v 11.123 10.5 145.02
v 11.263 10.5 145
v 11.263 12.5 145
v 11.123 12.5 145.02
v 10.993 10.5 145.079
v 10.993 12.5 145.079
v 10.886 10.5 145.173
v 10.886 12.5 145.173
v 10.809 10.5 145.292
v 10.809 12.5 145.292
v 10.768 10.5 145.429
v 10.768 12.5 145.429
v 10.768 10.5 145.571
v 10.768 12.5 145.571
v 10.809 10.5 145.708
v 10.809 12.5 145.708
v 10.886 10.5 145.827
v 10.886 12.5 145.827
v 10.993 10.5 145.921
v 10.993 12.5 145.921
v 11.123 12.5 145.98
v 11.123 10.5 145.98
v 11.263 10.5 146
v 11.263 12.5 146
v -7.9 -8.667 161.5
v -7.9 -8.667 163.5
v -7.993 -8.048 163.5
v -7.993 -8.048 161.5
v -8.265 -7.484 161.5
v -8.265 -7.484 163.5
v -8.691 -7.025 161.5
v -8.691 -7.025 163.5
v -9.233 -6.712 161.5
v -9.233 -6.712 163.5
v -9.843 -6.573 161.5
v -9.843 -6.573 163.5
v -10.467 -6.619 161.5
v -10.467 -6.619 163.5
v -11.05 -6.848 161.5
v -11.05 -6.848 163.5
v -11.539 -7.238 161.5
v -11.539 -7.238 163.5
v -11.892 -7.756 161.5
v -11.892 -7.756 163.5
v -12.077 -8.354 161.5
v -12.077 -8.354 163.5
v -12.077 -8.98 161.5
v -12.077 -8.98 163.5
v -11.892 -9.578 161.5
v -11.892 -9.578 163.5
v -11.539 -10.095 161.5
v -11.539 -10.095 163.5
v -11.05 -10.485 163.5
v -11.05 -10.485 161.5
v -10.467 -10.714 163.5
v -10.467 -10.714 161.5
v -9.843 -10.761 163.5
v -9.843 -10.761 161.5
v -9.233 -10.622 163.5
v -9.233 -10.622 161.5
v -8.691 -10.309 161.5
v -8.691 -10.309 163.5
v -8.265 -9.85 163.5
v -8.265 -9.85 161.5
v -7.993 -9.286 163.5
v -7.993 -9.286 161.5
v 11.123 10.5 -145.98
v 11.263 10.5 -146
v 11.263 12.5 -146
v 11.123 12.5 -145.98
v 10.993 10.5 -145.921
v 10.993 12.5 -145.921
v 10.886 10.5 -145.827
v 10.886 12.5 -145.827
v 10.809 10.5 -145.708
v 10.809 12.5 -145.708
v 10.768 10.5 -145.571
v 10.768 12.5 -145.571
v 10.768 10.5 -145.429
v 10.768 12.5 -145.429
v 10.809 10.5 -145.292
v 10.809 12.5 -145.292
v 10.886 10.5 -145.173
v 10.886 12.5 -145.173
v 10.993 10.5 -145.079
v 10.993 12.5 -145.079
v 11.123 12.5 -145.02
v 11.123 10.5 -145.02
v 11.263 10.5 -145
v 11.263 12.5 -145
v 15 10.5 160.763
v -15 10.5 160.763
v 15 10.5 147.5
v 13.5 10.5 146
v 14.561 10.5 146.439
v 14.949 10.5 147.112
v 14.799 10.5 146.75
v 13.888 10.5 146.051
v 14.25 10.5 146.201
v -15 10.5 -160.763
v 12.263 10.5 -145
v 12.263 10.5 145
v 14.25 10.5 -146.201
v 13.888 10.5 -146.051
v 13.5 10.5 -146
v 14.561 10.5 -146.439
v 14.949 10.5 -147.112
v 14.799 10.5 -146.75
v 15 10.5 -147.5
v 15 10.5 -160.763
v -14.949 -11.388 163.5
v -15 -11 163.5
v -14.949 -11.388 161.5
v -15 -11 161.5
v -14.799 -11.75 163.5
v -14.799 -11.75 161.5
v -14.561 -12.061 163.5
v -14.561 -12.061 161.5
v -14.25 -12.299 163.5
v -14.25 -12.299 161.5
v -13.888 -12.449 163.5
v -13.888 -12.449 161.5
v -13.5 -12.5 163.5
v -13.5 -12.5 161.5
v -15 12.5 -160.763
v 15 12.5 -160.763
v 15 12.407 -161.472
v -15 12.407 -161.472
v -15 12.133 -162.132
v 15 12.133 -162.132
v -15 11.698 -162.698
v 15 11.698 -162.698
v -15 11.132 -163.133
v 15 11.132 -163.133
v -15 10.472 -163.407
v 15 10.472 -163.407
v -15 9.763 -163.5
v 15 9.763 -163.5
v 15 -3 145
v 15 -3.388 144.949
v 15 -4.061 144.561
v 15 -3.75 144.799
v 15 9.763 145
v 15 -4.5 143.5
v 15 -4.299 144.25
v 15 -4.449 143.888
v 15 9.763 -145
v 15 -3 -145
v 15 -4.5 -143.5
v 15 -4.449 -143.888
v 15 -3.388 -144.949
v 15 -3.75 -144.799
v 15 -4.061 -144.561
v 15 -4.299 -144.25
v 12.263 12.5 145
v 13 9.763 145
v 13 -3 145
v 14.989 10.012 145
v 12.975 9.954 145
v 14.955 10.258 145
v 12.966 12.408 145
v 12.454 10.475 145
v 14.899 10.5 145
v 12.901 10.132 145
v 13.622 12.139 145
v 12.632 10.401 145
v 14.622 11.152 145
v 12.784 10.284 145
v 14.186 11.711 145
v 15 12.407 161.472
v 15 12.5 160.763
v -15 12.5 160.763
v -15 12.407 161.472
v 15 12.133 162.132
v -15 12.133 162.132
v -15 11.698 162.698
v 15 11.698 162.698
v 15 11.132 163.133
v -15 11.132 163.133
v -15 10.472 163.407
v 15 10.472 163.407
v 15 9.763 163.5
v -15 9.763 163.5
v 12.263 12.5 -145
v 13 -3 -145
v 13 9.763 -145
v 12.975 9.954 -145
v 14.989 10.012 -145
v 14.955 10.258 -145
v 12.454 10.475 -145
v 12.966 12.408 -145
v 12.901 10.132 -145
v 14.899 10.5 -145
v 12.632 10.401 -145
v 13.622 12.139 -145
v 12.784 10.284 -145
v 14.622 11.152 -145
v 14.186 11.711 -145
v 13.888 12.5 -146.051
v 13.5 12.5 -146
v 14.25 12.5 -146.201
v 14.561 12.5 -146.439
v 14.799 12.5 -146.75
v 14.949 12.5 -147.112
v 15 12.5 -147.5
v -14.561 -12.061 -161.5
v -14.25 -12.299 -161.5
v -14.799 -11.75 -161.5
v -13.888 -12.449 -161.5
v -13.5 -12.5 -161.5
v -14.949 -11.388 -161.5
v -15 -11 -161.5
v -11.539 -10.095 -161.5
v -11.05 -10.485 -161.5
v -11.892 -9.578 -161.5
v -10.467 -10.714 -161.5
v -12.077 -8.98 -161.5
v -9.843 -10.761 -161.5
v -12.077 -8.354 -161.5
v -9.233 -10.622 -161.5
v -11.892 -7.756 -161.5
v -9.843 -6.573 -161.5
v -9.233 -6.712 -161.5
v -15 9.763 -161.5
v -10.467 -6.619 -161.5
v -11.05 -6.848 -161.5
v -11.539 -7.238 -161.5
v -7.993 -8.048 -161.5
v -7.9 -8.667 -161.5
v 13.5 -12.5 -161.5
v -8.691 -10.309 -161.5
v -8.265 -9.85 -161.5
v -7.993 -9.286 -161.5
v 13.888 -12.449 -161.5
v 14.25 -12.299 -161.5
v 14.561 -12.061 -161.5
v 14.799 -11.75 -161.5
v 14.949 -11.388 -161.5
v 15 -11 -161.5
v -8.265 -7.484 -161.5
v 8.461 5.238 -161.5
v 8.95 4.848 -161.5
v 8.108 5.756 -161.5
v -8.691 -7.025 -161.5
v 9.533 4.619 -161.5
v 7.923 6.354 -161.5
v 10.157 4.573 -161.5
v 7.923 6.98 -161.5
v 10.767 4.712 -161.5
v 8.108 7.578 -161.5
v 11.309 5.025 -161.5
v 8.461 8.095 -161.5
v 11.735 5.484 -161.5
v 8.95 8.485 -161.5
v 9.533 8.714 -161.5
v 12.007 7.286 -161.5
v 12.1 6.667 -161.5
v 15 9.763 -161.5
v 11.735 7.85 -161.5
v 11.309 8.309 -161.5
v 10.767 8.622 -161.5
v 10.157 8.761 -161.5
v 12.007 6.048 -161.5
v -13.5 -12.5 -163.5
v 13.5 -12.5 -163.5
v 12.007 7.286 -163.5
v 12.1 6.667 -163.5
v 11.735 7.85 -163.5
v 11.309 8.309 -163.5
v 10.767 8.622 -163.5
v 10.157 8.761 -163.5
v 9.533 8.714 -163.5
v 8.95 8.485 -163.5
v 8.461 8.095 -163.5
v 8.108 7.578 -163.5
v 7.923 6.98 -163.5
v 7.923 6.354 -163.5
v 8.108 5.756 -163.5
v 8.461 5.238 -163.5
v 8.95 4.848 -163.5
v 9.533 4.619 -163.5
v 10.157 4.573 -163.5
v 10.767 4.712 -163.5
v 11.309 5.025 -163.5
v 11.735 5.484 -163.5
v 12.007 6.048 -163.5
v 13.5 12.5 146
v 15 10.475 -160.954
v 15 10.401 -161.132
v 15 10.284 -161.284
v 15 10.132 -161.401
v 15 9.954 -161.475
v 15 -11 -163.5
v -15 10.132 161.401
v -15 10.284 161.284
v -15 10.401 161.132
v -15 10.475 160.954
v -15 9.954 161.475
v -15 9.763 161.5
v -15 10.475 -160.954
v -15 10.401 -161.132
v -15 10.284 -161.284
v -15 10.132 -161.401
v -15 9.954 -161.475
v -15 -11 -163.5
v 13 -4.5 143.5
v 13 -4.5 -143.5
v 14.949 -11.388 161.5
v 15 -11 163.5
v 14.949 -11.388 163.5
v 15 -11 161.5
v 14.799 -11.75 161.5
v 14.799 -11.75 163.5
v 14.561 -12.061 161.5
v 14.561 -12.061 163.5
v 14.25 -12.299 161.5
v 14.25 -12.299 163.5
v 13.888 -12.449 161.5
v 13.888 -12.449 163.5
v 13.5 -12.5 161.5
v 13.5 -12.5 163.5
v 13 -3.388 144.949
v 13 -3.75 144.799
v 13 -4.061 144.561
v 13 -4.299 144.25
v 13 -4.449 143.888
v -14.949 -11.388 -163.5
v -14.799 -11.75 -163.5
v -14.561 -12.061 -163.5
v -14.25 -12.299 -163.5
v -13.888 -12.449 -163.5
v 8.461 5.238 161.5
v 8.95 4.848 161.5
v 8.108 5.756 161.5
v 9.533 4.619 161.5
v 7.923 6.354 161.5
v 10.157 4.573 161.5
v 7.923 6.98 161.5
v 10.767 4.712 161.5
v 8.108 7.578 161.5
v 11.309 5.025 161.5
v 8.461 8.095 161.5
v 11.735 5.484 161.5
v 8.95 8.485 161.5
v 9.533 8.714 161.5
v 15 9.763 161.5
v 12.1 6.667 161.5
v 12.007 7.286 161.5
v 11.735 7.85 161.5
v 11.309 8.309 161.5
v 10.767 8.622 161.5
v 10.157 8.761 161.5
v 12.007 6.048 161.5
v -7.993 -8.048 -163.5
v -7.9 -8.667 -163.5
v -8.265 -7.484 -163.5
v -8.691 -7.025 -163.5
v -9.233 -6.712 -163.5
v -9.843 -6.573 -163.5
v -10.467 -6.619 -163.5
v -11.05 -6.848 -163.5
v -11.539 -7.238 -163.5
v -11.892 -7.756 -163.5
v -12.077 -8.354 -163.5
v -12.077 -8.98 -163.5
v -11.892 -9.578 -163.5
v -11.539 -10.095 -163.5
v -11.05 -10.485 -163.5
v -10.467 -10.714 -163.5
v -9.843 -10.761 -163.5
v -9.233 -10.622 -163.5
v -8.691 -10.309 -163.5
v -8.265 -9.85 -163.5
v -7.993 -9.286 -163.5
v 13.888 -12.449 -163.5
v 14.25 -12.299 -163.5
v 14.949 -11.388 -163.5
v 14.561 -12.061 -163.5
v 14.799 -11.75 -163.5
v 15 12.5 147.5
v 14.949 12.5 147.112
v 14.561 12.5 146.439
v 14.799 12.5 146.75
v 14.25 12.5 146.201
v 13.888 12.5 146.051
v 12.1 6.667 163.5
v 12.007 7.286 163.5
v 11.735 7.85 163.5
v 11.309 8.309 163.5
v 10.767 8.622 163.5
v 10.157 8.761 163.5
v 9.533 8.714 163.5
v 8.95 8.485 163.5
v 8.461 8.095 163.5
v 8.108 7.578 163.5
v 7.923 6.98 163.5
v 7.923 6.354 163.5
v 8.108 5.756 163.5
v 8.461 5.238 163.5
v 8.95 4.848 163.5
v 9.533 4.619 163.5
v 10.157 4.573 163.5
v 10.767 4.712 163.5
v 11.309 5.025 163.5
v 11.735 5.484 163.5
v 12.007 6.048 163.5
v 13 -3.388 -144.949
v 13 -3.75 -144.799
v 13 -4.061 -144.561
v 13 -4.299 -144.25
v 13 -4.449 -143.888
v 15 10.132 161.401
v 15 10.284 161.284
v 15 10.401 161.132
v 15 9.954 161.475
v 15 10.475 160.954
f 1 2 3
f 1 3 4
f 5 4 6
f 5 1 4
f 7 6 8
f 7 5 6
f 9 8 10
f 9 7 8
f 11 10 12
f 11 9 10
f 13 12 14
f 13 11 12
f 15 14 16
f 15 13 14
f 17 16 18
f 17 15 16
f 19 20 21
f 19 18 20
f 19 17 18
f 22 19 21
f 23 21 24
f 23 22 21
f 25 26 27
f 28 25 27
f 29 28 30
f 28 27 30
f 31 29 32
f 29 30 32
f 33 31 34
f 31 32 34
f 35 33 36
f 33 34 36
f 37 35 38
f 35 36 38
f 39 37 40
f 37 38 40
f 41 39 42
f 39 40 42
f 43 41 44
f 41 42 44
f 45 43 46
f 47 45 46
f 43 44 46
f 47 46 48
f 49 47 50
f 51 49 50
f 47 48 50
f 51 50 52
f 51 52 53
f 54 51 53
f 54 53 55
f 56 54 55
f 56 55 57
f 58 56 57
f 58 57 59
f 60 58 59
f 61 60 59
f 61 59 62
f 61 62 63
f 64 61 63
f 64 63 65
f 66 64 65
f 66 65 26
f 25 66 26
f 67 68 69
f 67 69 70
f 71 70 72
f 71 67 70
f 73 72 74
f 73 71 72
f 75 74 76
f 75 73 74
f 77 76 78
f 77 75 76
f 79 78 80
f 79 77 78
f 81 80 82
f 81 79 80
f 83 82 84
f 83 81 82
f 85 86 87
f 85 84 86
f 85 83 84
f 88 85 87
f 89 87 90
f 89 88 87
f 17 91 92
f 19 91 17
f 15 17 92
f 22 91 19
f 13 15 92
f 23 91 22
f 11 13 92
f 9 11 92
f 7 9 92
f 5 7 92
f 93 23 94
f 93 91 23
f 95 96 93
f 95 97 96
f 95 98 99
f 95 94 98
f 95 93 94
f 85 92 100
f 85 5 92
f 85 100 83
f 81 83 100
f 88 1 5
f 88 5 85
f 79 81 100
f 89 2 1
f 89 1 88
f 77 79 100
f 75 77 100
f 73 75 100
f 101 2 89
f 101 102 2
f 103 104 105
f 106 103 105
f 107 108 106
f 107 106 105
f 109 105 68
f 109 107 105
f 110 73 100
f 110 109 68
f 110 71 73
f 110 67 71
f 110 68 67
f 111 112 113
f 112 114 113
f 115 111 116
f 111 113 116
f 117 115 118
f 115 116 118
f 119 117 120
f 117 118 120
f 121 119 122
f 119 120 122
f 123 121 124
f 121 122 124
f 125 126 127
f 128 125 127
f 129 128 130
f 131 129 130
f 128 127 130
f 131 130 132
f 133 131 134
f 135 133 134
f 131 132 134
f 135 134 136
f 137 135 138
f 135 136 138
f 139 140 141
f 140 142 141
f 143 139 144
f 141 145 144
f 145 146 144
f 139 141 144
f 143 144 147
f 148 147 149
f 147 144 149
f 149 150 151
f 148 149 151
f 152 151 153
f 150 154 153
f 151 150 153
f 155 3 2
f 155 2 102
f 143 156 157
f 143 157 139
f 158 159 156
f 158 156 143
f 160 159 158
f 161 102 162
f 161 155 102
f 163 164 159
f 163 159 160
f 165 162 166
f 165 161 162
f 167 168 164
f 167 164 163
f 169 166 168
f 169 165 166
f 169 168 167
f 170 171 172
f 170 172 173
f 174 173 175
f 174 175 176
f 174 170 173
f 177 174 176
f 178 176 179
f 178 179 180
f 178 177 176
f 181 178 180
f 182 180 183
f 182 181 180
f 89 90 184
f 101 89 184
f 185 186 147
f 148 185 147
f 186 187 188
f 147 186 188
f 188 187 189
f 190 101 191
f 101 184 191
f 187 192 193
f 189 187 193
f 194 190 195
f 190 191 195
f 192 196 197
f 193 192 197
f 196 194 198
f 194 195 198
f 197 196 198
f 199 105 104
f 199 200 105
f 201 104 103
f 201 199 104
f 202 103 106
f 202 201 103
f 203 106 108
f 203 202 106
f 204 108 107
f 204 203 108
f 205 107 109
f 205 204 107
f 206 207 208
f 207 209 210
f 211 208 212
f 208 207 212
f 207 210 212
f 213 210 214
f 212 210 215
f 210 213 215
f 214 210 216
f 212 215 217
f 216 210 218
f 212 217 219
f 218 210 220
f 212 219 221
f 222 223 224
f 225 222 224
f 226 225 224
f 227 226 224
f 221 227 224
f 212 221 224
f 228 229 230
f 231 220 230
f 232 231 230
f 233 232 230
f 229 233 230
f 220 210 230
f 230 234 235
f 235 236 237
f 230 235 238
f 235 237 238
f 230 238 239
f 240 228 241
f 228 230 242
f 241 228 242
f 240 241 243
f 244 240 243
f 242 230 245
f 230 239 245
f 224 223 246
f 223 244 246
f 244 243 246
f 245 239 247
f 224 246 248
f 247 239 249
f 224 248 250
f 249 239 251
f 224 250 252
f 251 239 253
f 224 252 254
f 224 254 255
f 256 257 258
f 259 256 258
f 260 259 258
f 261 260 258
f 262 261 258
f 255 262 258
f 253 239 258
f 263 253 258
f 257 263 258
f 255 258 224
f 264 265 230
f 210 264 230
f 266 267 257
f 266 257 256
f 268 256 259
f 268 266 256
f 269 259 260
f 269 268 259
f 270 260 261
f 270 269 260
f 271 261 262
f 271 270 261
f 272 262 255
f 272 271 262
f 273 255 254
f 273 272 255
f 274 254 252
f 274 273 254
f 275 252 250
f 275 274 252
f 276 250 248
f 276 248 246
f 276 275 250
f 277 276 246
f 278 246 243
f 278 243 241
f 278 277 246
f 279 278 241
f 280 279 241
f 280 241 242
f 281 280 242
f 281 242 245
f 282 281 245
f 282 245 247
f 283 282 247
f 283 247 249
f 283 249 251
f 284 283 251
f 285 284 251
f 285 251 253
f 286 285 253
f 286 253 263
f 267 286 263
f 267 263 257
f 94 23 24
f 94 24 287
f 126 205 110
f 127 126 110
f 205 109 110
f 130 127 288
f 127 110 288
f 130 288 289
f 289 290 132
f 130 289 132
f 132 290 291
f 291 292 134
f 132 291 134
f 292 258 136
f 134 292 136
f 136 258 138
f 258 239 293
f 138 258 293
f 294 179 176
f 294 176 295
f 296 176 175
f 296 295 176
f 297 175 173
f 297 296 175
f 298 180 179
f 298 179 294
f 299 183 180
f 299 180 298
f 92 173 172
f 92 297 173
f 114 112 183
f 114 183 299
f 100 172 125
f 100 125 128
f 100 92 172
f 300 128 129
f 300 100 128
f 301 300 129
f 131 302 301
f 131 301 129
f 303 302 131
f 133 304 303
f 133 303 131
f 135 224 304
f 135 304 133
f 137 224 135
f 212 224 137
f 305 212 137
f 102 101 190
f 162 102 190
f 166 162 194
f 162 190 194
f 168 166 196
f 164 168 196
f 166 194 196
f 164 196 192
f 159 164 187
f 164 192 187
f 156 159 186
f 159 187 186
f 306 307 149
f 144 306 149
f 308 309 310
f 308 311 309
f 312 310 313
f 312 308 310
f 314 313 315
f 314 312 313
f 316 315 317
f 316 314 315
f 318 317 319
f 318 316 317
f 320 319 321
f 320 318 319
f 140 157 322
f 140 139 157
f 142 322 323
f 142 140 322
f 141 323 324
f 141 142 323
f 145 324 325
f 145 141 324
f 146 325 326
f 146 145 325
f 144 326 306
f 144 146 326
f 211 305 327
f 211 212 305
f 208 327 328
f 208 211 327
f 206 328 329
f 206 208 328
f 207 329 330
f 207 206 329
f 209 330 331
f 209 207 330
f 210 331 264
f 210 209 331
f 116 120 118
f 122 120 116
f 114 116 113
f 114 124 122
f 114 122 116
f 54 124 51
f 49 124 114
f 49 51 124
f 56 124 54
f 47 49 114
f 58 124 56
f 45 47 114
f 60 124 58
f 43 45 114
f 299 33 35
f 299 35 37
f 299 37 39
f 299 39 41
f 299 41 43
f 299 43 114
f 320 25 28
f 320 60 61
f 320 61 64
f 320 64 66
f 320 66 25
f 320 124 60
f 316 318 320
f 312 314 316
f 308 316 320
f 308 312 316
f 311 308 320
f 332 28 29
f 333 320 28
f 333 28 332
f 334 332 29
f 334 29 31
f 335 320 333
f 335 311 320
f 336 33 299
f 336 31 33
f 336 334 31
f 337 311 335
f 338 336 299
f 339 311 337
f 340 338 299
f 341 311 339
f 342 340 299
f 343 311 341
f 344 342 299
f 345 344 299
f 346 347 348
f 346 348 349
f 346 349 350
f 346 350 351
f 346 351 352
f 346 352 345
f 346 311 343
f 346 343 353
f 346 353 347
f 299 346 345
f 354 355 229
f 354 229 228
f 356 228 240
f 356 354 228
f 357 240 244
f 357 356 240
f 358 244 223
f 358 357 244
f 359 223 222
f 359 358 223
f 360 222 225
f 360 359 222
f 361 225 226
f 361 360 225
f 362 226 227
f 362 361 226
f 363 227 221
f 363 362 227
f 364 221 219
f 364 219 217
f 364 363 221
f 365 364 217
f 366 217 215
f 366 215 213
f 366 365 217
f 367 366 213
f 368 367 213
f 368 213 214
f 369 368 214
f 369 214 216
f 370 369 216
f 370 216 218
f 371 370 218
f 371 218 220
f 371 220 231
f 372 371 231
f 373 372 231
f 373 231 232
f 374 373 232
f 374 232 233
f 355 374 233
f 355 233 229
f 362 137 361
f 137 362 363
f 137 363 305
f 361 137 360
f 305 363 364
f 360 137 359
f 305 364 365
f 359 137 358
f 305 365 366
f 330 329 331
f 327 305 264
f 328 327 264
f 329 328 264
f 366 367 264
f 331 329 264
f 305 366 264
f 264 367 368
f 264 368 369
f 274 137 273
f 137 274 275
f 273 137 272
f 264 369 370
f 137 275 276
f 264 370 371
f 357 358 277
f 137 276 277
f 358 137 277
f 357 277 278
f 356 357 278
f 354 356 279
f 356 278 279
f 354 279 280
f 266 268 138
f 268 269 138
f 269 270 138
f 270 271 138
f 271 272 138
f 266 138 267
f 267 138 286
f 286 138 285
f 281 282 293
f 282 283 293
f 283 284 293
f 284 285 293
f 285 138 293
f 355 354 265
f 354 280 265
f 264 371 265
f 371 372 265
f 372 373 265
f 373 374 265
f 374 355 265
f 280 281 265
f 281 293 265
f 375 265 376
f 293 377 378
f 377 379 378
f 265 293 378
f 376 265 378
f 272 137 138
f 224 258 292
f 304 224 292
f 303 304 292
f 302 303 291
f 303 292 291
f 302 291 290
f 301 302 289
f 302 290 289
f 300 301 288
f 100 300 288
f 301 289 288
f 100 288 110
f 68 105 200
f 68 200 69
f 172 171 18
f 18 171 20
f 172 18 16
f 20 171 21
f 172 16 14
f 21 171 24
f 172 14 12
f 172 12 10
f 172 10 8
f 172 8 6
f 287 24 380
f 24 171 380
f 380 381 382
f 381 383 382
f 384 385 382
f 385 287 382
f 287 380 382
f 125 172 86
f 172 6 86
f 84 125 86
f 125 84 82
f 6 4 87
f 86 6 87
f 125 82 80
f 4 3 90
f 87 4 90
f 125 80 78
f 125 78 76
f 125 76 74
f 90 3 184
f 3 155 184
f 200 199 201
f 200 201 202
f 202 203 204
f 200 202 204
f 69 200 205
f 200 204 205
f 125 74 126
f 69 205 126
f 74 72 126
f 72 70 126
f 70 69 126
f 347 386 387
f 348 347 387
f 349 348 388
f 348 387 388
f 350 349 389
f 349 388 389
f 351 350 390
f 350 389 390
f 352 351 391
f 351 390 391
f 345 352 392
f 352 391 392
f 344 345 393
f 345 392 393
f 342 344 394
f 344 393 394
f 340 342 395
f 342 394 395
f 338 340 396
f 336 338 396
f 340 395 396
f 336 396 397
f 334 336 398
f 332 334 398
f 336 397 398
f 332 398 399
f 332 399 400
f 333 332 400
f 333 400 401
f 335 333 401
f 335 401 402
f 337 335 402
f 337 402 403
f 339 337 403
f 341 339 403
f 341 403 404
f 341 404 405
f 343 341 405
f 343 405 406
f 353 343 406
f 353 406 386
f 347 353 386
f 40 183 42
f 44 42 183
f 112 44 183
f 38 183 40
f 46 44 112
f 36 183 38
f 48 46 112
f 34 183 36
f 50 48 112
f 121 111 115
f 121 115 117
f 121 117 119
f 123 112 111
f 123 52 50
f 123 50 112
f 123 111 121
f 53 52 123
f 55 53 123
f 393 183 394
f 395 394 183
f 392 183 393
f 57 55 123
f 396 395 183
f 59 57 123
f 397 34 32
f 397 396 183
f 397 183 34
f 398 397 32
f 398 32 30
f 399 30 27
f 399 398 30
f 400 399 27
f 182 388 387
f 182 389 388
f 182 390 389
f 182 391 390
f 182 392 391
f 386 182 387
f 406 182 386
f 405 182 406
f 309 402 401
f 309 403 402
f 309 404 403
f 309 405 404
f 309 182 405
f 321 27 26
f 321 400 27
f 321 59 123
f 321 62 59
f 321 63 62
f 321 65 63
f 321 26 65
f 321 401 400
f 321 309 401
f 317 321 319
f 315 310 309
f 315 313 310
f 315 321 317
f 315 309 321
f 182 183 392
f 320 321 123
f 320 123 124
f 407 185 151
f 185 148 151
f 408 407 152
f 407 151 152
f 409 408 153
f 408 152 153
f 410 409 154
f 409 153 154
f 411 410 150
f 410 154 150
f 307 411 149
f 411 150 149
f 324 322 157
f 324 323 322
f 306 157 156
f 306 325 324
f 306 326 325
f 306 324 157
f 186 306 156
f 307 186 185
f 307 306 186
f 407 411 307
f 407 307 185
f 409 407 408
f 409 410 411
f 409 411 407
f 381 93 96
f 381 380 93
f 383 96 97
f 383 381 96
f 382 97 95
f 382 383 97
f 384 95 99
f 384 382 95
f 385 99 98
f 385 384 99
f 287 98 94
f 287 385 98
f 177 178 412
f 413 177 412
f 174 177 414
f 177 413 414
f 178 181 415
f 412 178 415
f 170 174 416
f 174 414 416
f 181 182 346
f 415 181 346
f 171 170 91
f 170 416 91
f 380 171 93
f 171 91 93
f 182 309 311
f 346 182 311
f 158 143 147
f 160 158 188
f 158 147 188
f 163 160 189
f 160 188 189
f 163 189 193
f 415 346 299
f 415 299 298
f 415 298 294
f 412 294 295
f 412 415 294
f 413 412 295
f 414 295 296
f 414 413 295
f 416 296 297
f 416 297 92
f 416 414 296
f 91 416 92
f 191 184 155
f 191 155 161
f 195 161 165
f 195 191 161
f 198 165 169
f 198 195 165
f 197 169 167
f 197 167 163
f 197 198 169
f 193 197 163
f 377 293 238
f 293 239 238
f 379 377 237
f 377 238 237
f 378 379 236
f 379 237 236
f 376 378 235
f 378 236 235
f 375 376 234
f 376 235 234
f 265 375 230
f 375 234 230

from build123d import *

# Parameters (mm, degrees)
SKETCH1_W                    = 327
SKETCH1_H                    = 2
BASE_FLANGE1_DEPTH           = 15
EDGE_FLANGE1_STRIP_W         = 9.4732
EDGE_FLANGE1_STRIP_H         = 2
EDGE_FLANGE1_STRIP_CUT_DEPTH = 30
EDGE_FLANGE1_DEPTH           = 30
CUT_EXTRUDE1_REACH           = 329.582
SKETCH9_R                    = 2.1
EDGE_FLANGE2_START           = 9.7634
EDGE_FLANGE2_DEPTH           = 3.2366
EDGE_FLANGE2_START_2         = -4.5
EDGE_FLANGE2_2_OUTLINE_W     = 2
EDGE_FLANGE2_2_OUTLINE_H     = 290
EDGE_FLANGE2_2_DEPTH         = 14.2634
EDGE_FLANGE2_START_3         = -145
EDGE_FLANGE2_3_DEPTH         = 290
EDGE_FLANGE2_4_DEPTH         = 290
FILLET1_R                    = 1.5


with BuildPart() as part:
    # Base-Flange1: sheet metal written as solids
    # Sketch1 → Base-Flange1 (new, symmetric)
    with BuildSketch(Plane(origin=(0, 0, 0), x_dir=(0, 0, -1), z_dir=(1, 0, 0))):
        with Locations((0, 11.5)):
            Rectangle(SKETCH1_W, SKETCH1_H)
    extrude(amount=BASE_FLANGE1_DEPTH, both=True)

    # Edge-Flange1: sheet metal written as solids
    # Edge-Flange1 strip (on a plane across the edge) → Edge-Flange1 strip cut (cut)
    with BuildSketch(Plane(origin=(15, 10.5, 163.5), x_dir=(0, 0, -1), z_dir=(-1, 0, 0))):
        with Locations((-2, -1)):
            Rectangle(EDGE_FLANGE1_STRIP_W, EDGE_FLANGE1_STRIP_H)
    edge_flange1_strip_cut = extrude(amount=EDGE_FLANGE1_STRIP_CUT_DEPTH, mode=Mode.SUBTRACT)

    # Edge-Flange1 section (on a plane across the edge) → Edge-Flange1 (add)
    with BuildSketch(Plane(origin=(15, 10.5, 163.5), x_dir=(0, 0, -1), z_dir=(-1, 0, 0))):
        with BuildLine():
            Line((0, 0.7366), (0, 23))
            Line((0, 23), (2, 23))
            Line((2, 23), (2, 0.7366))
            ThreePointArc((2, 0.7366), (2.215745145, 0.215745145), (2.7366, 0))
            Line((2.7366, 0), (2.7366, -2))
            ThreePointArc((2.7366, -2), (0.801531583, -1.198468417), (0, 0.7366))
        make_face()
    edge_flange1 = extrude(amount=EDGE_FLANGE1_DEPTH)

    # Mirror1: Edge-Flange1 strip cut, Edge-Flange1 across plane
    add(edge_flange1_strip_cut.mirror(Plane.XY), mode=Mode.SUBTRACT)
    add(edge_flange1.mirror(Plane.XY))

    # Sketch9 → Cut-Extrude1 (cut, up to next)
    with BuildSketch(Plane.XY.offset(163.5), mode=Mode.PRIVATE) as cut_extrude1_sk1:
        with Locations((10, 6.666666667)):
            Circle(SKETCH9_R)
    cut_extrude1_tool1 = extrude(cut_extrude1_sk1.sketch, amount=-CUT_EXTRUDE1_REACH, mode=Mode.PRIVATE) & part.part
    # Sketch9 → Cut-Extrude1 (cut, up to next)
    with BuildSketch(Plane.XY.offset(163.5), mode=Mode.PRIVATE) as cut_extrude1_sk2:
        with Locations((-10, -8.666666667)):
            Circle(SKETCH9_R)
    cut_extrude1_tool2 = extrude(cut_extrude1_sk2.sketch, amount=-CUT_EXTRUDE1_REACH, mode=Mode.PRIVATE) & part.part
    cut_extrude1_1 = cut_extrude1_tool1.solids().sort_by_distance((10, 6.666667, 163.5))[0]
    add(cut_extrude1_1, mode=Mode.SUBTRACT)
    cut_extrude1_2 = cut_extrude1_tool2.solids().sort_by_distance((-10, -8.666667, 163.5))[0]
    add(cut_extrude1_2, mode=Mode.SUBTRACT)
    cut_extrude1 = cut_extrude1_1 + cut_extrude1_2  # Cut-Extrude1 as one shape, for the pattern or mirror that repeats it

    # Mirror2: Cut-Extrude1 across plane
    add(cut_extrude1.mirror(Plane.XY), mode=Mode.SUBTRACT)

    # Edge-Flange2: read off the stored shape, not the designer's step
    # Edge-Flange2 outline → Edge-Flange2 (cut)
    with BuildSketch(Plane(origin=(0, 0, 0), x_dir=(1, 0, 0), z_dir=(0, 1, 0)).offset(EDGE_FLANGE2_START)):
        with BuildLine():
            Line((15, -146), (15, -145))
            Line((15, -145), (11.2634, -145))
            ThreePointArc((11.2634, -145), (10.7634, -145.5), (11.2634, -146))
            Line((11.2634, -146), (15, -146))
        make_face()
        with BuildLine():
            Line((11.2634, 145), (15, 145))
            Line((15, 145), (15, 146))
            Line((15, 146), (11.2634, 146))
            ThreePointArc((11.2634, 146), (10.7634, 145.5), (11.2634, 145))
        make_face()
    extrude(amount=EDGE_FLANGE2_DEPTH, mode=Mode.SUBTRACT)

    # Edge-Flange2 3 outline → Edge-Flange2 3 (cut)
    with BuildSketch(Plane.XY.offset(EDGE_FLANGE2_START_3)):
        with BuildLine():
            ThreePointArc((12.2634, 12.5), (13.917667209, 11.943395312), (14.899002398, 10.5))
            Line((14.899002398, 10.5), (15, 10.5))
            Line((15, 10.5), (15, 12.5))
            Line((15, 12.5), (12.2634, 12.5))
        make_face()
    extrude(amount=EDGE_FLANGE2_3_DEPTH, mode=Mode.SUBTRACT)



with BuildPart() as body_2:
    # Edge-Flange2 2 outline → Edge-Flange2 2 (new body)
    with BuildSketch(Plane(origin=(0, 0, 0), x_dir=(1, 0, 0), z_dir=(0, 1, 0)).offset(EDGE_FLANGE2_START_2)):
        with Locations((14, 0)):
            Rectangle(EDGE_FLANGE2_2_OUTLINE_W, EDGE_FLANGE2_2_OUTLINE_H)
    extrude(amount=EDGE_FLANGE2_2_DEPTH)


with BuildPart() as part_1:
    add(part.part)

    add(body_2.part)  # Edge-Flange2 4 merges body 2
    # Edge-Flange2 4 outline → Edge-Flange2 4 (add)
    with BuildSketch(Plane.XY.offset(EDGE_FLANGE2_START_3)):
        with BuildLine():
            Line((13, 9.7634), (15, 9.7634))
            ThreePointArc((15, 9.7634), (14.974633029, 10.135145906), (14.899002398, 10.5))
            Line((14.899002398, 10.5), (12.2634, 10.5))
            ThreePointArc((12.2634, 10.5), (12.784254855, 10.284254855), (13, 9.7634))
        make_face()
    extrude(amount=EDGE_FLANGE2_4_DEPTH)

    # Fillet1
    fillet1_edges = [part_1.edges().sort_by_distance(p)[0] for p in [
        (15, 11.5, 146),
        (15, 11.5, -146),
        (14, -4.5, -145),
        (14, -4.5, 145),
        (15, -12.5, 162.5),
        (-15, -12.5, 162.5),
        (-15, -12.5, -162.5),
        (15, -12.5, -162.5),
    ]]
    fillet(fillet1_edges, radius=FILLET1_R)


solid = part_1.part
